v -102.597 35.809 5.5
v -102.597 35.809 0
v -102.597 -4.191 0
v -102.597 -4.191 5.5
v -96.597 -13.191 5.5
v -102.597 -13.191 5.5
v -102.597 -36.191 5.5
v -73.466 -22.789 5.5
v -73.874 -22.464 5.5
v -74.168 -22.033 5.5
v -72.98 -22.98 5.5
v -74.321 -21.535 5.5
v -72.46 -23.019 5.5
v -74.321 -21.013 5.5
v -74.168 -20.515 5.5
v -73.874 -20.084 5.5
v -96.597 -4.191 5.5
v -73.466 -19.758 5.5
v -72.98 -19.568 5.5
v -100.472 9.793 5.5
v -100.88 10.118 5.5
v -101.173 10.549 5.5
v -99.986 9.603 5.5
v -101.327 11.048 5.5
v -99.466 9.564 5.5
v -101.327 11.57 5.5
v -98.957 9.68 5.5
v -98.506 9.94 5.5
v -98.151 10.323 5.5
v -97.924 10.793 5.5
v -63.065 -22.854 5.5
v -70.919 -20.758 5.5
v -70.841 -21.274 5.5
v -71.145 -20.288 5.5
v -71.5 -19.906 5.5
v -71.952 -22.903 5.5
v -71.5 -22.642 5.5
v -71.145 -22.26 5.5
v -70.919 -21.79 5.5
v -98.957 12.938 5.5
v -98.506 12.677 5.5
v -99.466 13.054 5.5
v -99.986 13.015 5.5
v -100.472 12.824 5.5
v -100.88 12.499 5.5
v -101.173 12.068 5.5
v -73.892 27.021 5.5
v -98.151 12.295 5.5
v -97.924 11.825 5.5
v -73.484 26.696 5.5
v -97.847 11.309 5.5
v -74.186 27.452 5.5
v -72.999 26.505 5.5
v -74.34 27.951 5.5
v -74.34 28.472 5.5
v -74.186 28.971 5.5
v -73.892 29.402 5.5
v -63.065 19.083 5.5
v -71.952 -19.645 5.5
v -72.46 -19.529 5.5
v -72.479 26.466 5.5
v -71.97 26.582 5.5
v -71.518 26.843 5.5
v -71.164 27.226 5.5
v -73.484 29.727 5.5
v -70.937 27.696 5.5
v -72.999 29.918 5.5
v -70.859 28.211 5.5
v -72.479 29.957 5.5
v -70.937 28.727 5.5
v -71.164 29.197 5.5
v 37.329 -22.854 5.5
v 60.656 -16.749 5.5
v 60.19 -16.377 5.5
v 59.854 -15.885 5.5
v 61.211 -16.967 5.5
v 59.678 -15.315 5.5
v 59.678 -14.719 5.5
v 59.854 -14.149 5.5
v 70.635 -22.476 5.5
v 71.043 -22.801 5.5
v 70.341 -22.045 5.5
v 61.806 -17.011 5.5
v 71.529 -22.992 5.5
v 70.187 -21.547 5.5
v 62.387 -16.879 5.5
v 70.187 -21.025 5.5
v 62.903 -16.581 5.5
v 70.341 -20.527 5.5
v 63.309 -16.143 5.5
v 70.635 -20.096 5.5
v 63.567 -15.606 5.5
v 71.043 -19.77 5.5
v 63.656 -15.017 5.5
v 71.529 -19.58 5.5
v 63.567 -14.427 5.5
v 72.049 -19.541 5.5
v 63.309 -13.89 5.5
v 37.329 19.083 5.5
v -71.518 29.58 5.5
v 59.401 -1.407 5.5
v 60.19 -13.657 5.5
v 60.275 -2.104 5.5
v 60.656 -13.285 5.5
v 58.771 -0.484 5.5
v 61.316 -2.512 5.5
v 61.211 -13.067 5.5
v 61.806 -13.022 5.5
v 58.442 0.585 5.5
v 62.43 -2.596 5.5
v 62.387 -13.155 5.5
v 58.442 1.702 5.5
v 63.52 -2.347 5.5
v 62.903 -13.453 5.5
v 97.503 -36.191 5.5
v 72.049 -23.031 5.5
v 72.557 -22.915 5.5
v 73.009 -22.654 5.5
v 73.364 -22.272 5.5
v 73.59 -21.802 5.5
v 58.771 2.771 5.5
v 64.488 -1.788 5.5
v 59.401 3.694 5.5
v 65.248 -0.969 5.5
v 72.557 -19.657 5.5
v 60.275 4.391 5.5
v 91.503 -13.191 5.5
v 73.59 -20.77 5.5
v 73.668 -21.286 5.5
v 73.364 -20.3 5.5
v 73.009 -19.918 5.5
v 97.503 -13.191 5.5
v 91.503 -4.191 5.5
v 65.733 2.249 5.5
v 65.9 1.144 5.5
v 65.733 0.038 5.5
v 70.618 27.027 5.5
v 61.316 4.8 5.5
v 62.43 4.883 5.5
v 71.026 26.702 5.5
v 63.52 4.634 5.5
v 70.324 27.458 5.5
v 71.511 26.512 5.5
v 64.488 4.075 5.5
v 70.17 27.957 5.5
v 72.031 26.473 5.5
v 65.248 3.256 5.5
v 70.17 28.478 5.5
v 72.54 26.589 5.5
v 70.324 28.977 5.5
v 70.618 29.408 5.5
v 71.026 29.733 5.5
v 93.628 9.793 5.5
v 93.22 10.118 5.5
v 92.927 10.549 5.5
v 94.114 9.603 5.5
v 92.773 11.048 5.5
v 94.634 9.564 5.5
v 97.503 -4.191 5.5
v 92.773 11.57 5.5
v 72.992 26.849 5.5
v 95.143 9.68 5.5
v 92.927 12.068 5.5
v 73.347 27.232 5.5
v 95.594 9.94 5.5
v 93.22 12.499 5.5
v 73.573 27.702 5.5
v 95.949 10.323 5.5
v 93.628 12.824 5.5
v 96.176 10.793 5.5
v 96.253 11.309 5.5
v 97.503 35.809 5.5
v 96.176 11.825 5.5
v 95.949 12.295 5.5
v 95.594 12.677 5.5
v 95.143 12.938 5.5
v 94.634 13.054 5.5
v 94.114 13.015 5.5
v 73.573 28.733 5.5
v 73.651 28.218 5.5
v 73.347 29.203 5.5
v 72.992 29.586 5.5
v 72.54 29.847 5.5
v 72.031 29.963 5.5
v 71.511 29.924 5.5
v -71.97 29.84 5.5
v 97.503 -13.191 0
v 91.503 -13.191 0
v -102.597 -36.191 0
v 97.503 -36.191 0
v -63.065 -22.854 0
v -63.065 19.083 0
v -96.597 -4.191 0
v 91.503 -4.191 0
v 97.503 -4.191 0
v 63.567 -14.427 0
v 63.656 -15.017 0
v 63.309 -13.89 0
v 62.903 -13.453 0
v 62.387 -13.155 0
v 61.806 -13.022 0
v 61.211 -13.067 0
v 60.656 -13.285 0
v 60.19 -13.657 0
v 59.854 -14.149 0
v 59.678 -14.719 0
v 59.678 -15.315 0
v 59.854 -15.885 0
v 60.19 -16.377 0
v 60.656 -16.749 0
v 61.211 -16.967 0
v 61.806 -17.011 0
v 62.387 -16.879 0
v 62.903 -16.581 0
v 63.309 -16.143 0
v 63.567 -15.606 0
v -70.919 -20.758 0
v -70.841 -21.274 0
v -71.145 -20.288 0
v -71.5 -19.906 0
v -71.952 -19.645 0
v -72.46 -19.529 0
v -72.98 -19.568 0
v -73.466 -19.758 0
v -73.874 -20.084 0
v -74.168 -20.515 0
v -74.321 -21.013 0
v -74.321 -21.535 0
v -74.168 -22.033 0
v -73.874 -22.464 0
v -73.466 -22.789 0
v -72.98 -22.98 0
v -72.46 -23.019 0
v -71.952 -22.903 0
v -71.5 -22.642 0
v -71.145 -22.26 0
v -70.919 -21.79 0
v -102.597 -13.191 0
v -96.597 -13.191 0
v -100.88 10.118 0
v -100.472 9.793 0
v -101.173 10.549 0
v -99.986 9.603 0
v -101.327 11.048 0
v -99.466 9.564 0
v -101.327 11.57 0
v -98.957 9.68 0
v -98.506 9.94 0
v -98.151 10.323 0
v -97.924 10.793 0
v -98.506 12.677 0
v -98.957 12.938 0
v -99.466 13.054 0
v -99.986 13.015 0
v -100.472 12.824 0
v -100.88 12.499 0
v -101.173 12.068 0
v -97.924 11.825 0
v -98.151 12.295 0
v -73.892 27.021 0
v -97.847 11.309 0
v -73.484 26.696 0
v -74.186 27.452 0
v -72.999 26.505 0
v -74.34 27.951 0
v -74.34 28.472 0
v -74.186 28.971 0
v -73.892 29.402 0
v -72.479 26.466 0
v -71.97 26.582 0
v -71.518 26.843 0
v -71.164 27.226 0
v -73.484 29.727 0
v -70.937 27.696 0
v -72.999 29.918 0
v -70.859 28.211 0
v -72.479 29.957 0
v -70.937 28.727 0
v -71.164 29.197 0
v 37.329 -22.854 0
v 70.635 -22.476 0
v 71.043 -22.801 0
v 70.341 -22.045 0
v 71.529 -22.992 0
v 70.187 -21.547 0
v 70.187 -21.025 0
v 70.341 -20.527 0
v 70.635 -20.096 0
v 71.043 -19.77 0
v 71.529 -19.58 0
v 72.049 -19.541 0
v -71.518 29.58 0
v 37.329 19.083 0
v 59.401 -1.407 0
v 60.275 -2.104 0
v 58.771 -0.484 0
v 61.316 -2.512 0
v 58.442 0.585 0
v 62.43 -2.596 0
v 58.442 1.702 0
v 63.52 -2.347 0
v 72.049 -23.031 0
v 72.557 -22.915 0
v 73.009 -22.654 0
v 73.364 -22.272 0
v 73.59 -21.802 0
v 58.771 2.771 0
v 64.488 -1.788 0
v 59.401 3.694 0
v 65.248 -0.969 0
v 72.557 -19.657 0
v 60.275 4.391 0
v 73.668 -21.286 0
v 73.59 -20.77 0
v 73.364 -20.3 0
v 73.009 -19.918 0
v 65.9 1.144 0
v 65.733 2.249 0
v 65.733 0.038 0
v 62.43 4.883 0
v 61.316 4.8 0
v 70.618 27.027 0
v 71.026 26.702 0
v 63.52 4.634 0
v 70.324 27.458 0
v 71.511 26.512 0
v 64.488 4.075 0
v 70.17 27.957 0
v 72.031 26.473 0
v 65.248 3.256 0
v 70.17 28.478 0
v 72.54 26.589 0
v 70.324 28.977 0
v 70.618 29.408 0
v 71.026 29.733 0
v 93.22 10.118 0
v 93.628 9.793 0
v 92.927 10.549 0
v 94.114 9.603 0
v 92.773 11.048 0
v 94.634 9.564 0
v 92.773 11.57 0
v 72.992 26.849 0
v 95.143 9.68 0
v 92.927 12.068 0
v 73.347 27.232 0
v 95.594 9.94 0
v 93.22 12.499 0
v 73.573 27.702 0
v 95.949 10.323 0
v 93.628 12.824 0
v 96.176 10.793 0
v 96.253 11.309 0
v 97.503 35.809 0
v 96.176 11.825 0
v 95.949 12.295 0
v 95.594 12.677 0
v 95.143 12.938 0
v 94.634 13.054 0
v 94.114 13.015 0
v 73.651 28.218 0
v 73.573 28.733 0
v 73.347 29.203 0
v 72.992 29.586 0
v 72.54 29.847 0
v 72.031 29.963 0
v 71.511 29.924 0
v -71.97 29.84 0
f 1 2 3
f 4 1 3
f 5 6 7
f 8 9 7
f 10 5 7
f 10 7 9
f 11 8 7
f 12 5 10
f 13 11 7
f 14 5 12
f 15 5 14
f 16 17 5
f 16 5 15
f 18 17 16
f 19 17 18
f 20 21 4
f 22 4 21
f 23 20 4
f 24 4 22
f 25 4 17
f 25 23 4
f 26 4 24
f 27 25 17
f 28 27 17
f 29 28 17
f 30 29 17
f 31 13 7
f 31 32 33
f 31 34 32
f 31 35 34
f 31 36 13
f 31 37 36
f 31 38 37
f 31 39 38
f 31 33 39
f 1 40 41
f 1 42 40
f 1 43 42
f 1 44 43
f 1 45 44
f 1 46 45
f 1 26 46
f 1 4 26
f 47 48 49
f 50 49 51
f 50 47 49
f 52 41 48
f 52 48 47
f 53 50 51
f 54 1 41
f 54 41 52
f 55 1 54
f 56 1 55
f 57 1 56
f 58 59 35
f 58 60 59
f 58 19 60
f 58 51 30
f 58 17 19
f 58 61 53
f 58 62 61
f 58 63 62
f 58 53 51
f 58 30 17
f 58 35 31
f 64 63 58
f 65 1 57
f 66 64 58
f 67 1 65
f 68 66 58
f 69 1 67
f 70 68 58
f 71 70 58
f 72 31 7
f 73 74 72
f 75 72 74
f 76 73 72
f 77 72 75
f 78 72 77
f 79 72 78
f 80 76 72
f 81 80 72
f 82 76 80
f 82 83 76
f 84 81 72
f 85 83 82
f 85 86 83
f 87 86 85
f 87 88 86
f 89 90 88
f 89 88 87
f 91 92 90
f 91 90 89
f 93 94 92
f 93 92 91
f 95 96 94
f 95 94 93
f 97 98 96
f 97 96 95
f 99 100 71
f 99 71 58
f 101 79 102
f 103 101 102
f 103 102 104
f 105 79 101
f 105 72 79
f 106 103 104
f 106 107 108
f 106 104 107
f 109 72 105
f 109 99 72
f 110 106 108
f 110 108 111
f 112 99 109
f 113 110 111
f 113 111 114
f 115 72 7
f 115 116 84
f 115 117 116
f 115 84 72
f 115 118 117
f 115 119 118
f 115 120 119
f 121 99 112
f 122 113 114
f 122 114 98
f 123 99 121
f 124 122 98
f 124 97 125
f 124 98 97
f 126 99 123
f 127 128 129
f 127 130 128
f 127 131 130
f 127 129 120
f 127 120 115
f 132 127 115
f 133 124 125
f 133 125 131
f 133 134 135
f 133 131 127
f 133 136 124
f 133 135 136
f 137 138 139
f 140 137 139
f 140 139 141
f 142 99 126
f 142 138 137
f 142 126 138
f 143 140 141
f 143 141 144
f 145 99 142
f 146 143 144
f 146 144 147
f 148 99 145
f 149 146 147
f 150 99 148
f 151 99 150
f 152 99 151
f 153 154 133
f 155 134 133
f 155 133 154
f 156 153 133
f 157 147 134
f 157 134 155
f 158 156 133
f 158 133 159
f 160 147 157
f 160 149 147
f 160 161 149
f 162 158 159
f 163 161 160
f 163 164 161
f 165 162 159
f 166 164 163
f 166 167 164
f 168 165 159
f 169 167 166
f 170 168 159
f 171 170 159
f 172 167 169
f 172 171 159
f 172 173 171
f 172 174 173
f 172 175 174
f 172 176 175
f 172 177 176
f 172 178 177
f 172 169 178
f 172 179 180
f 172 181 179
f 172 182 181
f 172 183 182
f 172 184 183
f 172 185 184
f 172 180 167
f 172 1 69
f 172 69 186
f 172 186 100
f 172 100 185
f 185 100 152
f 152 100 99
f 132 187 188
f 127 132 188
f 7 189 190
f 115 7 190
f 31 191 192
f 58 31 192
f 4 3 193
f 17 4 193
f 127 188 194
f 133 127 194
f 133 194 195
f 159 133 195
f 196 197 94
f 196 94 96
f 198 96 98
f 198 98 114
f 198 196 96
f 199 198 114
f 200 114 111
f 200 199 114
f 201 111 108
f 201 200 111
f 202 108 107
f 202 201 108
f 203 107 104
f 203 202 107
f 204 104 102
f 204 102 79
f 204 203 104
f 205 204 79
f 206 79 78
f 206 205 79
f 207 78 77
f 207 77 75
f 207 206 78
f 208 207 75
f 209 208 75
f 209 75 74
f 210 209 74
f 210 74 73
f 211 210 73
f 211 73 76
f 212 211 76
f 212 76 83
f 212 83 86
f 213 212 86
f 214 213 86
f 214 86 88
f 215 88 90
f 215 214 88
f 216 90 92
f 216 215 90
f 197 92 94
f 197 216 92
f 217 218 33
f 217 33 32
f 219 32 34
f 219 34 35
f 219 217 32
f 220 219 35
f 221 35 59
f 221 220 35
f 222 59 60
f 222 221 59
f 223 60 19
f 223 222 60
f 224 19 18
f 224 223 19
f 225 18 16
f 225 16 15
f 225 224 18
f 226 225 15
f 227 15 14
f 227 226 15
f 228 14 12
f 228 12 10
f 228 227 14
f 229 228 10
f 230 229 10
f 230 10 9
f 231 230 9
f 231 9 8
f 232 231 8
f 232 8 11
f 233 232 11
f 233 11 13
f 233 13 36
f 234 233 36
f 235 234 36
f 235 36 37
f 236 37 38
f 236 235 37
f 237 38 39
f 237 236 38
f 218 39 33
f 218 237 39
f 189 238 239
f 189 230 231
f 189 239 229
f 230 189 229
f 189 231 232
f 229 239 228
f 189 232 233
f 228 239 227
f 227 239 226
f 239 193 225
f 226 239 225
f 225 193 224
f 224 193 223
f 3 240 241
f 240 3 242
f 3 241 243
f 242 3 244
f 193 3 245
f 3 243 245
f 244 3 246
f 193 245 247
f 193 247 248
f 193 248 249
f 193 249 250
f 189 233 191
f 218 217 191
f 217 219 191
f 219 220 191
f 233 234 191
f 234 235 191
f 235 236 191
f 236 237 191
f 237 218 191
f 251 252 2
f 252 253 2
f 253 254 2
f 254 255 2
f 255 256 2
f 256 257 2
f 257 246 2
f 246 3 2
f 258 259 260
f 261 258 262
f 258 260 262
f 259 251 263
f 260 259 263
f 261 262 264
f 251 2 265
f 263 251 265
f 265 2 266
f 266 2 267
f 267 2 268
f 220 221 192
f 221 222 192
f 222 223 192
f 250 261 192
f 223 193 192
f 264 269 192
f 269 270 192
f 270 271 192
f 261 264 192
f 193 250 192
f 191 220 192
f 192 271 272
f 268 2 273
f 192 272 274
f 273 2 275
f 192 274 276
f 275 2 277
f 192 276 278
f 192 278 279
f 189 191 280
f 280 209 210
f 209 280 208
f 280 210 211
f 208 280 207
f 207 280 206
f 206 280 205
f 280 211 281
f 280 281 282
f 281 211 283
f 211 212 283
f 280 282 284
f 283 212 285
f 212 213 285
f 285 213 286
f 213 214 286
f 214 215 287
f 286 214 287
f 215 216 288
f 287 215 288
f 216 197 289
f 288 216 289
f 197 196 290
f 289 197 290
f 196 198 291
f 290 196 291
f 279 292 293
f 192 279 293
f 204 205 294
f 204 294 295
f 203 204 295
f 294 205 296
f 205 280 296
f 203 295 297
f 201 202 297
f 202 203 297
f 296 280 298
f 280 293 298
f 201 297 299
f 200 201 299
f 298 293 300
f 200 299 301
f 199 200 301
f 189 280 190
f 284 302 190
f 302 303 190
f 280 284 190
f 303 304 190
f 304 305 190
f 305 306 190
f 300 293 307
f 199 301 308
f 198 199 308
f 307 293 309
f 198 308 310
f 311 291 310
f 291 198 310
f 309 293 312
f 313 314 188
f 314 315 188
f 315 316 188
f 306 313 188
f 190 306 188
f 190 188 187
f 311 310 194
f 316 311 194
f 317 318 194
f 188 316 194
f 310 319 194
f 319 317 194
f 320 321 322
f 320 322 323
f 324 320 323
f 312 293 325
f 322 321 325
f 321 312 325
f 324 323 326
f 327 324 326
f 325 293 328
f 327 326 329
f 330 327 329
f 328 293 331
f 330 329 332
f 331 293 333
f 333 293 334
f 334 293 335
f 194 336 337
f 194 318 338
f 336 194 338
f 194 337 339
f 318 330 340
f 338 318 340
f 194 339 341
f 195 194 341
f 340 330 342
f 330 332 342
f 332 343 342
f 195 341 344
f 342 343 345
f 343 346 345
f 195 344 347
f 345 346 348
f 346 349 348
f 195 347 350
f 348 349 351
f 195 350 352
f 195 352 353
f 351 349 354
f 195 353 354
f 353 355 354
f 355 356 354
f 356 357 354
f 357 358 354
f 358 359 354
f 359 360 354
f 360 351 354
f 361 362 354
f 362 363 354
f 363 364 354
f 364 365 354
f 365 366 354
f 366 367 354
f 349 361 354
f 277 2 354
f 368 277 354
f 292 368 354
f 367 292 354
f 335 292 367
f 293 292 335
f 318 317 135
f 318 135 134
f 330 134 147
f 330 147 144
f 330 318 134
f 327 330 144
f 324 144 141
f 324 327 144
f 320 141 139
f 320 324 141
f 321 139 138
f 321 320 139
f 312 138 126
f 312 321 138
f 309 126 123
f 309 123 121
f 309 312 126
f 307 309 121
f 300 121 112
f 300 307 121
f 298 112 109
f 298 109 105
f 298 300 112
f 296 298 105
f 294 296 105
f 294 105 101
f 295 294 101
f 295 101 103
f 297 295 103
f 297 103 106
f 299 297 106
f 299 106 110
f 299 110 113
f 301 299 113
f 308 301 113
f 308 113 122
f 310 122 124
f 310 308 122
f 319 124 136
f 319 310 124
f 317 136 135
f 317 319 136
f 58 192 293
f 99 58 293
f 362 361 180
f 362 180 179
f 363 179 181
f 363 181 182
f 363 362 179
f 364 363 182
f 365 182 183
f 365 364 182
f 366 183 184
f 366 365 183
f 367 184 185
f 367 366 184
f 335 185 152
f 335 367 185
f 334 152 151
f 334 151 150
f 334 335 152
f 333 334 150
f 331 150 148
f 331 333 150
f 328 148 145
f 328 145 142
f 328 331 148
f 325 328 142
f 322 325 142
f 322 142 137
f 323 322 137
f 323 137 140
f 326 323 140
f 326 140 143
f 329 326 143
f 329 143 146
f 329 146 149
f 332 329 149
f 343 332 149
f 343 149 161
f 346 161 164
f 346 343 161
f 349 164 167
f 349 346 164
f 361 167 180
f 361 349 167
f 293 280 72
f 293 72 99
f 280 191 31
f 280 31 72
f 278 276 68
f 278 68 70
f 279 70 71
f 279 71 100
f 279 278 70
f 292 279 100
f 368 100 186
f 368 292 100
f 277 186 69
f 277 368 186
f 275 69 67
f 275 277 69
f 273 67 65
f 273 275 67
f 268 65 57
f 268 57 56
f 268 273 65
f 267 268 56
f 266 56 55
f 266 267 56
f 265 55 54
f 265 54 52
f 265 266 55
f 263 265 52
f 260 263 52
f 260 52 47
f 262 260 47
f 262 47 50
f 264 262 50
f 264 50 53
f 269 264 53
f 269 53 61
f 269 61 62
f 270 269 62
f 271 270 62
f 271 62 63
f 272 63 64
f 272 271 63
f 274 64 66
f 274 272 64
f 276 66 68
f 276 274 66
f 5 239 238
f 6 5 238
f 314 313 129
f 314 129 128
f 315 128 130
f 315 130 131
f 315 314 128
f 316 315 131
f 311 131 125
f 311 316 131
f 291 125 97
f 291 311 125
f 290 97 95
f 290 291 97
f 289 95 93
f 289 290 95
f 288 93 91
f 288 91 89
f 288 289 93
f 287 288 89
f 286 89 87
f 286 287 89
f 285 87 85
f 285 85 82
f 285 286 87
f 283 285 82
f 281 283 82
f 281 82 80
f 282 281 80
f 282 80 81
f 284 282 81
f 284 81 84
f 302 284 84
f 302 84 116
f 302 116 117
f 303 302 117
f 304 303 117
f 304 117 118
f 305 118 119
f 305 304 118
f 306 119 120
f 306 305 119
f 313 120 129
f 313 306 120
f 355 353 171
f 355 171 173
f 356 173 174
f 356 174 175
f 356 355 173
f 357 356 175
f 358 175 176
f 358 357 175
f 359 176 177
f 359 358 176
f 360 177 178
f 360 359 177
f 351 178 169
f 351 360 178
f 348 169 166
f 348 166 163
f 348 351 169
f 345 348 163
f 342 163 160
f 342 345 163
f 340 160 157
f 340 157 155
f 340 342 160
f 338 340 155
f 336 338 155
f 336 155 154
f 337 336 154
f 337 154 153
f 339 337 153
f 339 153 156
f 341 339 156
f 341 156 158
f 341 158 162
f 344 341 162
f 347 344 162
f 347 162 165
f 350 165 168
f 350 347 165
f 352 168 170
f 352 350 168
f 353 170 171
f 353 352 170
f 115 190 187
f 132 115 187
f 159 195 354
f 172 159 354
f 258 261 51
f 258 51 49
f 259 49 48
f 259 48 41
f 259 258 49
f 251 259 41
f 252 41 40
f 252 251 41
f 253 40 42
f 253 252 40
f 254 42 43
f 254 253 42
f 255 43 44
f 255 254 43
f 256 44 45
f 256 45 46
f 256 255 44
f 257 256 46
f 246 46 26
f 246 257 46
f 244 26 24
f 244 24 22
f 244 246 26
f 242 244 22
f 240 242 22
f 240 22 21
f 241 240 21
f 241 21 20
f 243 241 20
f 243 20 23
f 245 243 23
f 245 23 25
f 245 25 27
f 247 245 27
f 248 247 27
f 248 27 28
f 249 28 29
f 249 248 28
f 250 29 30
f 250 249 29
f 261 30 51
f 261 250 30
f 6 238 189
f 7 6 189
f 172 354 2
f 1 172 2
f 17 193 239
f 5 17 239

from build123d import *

# Parameters (mm, degrees)
F0_R     = 1.75
F0_W     = 100.394129
F0_H     = 41.936789
F0_R_2   = 2
F0_R_3   = 3.75
F1_DEPTH = 5.5


with BuildPart() as f1:
    # F0 (on Top) → F1 (new body)
    with BuildSketch(Plane.XY):
        Polygon((97.50326, 35.808698), (-102.59674, 35.808698), (-102.59674, -4.191302), (-96.59674, -4.191302), (-96.59674, -13.191302), (-102.59674, -13.191302), (-102.59674, -36.191302), (97.50326, -36.191302), (97.50326, -13.191302), (91.50326, -13.191302), (91.50326, -4.191302), (97.50326, -4.191302), align=None)
        with Locations((-72.59103, -21.273935)):
            Circle(F0_R, mode=Mode.SUBTRACT)
        with Locations((-12.867824, -1.88542)):
            Rectangle(F0_W, F0_H, mode=Mode.SUBTRACT)
        with Locations((71.91792, -21.28585)):
            Circle(F0_R, mode=Mode.SUBTRACT)
        with Locations((61.65615, -15.016859)):
            Circle(F0_R_2, mode=Mode.SUBTRACT)
        with Locations((-99.59674, 11.308698)):
            Circle(F0_R, mode=Mode.SUBTRACT)
        with Locations((-72.609478, 28.211436)):
            Circle(F0_R, mode=Mode.SUBTRACT)
        with Locations((62.149974, 1.143538)):
            Circle(F0_R_3, mode=Mode.SUBTRACT)
        with Locations((94.50326, 11.308698)):
            Circle(F0_R, mode=Mode.SUBTRACT)
        with Locations((71.900612, 28.217664)):
            Circle(F0_R, mode=Mode.SUBTRACT)
    extrude(amount=F1_DEPTH)


solid = f1.part
